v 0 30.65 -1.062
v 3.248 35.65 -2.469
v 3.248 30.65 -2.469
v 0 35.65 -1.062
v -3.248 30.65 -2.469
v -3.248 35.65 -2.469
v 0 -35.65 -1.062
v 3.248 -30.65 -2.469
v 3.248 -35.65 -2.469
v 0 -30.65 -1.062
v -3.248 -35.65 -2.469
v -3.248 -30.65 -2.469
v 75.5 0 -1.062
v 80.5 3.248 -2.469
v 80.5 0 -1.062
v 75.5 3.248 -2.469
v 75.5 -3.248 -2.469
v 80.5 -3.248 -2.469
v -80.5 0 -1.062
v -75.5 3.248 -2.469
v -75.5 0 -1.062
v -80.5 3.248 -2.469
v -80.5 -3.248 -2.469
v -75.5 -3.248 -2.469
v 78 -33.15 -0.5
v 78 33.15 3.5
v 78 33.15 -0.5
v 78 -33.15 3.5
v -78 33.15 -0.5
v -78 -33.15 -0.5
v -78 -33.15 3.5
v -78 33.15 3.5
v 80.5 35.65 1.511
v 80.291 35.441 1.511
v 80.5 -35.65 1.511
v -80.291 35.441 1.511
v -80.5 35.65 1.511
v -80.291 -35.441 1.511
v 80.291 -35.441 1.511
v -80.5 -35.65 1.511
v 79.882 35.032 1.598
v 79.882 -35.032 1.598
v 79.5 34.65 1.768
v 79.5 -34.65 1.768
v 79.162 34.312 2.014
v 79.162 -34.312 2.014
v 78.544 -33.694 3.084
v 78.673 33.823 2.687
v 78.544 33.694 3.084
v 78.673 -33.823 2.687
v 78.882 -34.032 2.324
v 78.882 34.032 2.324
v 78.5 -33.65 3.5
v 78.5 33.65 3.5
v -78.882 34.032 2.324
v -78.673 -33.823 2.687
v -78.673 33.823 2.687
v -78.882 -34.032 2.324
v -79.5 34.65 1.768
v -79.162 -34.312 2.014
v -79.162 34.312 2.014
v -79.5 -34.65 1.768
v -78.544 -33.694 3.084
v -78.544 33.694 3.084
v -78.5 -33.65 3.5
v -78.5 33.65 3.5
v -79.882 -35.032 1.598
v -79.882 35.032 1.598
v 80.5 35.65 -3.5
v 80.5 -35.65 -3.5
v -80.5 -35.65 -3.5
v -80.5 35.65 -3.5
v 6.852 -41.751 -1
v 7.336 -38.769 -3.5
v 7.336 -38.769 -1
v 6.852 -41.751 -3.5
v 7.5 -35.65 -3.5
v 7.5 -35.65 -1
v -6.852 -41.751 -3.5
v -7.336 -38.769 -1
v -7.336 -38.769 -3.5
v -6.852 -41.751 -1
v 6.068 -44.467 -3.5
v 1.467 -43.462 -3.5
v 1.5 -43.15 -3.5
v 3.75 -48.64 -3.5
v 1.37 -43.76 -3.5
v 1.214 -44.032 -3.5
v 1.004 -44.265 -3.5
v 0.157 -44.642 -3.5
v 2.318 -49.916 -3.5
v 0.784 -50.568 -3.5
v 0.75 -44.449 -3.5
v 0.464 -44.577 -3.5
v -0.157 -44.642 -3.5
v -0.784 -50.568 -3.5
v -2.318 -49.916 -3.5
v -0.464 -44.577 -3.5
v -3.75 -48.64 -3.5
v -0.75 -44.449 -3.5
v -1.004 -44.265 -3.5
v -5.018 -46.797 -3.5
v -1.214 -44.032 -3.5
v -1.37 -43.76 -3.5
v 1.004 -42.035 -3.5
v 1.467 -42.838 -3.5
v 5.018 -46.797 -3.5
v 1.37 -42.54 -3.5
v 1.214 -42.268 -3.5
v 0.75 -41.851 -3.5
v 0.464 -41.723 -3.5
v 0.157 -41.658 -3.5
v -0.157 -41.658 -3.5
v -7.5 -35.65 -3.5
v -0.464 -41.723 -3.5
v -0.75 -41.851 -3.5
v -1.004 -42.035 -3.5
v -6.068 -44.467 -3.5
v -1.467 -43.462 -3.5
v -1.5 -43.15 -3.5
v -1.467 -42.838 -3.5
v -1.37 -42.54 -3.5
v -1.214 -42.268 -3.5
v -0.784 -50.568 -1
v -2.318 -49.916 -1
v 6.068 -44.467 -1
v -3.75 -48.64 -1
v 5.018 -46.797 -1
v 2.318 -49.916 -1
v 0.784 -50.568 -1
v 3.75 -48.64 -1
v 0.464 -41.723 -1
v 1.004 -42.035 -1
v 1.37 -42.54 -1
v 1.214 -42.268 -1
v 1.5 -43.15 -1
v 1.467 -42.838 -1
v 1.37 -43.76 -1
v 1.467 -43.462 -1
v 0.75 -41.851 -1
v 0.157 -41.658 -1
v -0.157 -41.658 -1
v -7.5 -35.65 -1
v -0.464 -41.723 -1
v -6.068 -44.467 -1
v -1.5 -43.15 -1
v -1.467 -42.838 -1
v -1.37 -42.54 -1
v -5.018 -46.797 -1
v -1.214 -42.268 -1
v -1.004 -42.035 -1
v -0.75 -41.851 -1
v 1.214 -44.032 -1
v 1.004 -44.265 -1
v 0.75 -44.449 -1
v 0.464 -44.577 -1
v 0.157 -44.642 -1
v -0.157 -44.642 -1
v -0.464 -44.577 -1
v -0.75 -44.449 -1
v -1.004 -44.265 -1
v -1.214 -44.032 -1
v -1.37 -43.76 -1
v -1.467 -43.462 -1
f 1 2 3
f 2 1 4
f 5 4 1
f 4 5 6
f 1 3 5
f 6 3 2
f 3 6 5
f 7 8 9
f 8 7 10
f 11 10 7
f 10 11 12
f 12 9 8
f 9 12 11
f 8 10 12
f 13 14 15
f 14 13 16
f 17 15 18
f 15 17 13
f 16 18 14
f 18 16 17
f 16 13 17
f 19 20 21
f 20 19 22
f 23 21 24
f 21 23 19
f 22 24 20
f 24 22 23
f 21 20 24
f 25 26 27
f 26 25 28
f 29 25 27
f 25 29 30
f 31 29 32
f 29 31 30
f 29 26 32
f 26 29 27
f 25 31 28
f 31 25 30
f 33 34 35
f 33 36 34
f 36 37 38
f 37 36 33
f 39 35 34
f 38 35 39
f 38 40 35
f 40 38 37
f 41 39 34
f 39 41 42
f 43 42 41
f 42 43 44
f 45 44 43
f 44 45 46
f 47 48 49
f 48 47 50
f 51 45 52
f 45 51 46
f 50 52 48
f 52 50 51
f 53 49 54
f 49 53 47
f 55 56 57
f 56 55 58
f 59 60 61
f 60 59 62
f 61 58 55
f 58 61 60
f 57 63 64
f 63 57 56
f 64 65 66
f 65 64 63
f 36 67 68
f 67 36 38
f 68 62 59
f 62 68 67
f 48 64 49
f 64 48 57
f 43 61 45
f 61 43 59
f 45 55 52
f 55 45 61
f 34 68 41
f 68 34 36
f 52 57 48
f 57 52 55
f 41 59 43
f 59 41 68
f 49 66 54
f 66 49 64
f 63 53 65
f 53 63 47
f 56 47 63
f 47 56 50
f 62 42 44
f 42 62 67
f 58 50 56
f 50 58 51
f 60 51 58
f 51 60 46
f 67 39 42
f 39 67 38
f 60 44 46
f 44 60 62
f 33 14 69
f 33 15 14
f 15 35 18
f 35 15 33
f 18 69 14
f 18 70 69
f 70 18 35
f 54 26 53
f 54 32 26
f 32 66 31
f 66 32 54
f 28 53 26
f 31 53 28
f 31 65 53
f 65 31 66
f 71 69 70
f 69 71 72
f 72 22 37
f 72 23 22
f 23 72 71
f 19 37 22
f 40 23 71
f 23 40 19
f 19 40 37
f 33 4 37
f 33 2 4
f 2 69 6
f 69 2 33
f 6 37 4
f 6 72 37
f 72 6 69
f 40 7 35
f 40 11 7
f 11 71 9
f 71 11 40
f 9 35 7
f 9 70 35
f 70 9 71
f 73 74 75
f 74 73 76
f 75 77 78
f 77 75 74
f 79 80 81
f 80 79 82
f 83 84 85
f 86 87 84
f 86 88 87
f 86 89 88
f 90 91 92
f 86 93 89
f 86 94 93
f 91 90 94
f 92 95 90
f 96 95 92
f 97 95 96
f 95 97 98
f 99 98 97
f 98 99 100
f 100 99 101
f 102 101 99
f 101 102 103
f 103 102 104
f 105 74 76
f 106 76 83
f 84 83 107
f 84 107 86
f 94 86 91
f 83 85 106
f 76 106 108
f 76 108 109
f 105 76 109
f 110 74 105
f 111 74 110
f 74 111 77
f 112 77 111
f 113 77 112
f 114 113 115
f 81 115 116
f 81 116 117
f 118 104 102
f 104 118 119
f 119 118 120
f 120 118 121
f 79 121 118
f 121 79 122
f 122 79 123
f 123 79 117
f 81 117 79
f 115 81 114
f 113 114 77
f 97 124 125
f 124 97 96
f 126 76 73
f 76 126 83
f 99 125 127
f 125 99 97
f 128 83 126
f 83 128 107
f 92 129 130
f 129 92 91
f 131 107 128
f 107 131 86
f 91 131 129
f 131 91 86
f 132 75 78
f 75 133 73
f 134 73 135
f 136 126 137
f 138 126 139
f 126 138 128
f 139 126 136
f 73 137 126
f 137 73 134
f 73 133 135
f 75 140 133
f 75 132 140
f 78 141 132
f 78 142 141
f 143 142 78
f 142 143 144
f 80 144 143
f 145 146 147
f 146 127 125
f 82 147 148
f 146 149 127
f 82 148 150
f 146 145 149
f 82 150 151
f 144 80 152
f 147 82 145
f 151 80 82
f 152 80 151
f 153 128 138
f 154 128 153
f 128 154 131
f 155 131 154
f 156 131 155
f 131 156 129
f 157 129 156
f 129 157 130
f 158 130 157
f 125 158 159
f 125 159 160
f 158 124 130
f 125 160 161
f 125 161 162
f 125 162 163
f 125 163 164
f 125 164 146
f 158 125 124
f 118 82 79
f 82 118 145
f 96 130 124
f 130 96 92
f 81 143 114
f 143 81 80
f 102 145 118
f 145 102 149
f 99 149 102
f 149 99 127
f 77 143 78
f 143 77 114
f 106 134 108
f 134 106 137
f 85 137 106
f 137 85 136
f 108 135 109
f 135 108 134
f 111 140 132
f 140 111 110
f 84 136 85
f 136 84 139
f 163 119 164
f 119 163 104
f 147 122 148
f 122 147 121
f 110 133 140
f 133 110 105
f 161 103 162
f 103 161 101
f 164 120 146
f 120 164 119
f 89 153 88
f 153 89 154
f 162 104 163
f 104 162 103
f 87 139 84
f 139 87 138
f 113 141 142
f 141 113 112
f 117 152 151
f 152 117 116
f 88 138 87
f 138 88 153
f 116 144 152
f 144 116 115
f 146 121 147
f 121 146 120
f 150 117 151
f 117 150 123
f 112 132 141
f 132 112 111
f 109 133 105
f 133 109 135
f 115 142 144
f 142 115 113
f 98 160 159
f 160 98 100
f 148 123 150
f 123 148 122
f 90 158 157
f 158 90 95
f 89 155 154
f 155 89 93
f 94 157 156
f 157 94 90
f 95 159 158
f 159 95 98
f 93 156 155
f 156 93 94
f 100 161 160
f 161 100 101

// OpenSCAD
//------------------Variables------------------\\ 

		//----Global Values----\\
			//The default unit in OpenSCAD is mm and this unit variable allows one to change the variables in the code with units other than mm. Default is 1, for mm, but cm is 10 and inches is 25.4. Note that this entails that you change EVERY variable (except maybe sfn)  so that one piece of the model is not ridiculously bigger/smaller than the other parts. 
				unit=1;

			//The detail in the cylinders/spheres of the shape.
				sfn=30;

		//----Bill Specifics----\\

			//The length of the bill.
				billength= 156;

			//The width of the bill. 
				billwidth = 66.3;

			//The thickness of the frame. 
				framethick = 5;
			
			//Bottom Thickness
				botthick = 2 ;

		//----Frame Specifics----\\

			//The border of the frame length-wise. This is the measurement from the inside of the frame to the outisde on the length (x) axis. The cylinders that shape the frame use this measurement.
				xframe = 5;

			//The border of the frame width-wise. This is the measurement from the inside of the frame to the outisde on the width (y) axis.
				yframe = 5;
		
			//How prominent the frame shaping is. Play with this value. Default is 2.
				frameshapethick = 1.25;

			//How raised the frame shaping is. Play with this value as well. 
				frameshaperaise = 1;
		
	//----Paper clip slit size----\\\
		//Width of the paperclip slit. Adjust this value if as you want. 
		slitwidth = 10;
		
		//Height of the slit. This is actually a size control but it mainly changes the size.
		slitheight = 7.5;

		//Where the slit is. Slit is in the middle by default but depending on size you may have to raise or lower this value.
		slitlift =-4;

		//Shape of slit in sides. Default is 3 (triangle) as its overhangs are not unbearable.
		slitshape=3;

		//Slit scale (x,y,z)
		slitscalex= 0.25;
		slitscaley= 1;
		slitscalez= 1;
	
	//----Hook sizing----\\
		//Hook size
		hooksize=15;

		//Hook hole size
		hookhole=3;

		//Hook thickness
		hookthick=2.5;

//-------------------Modules-------------------\\ 

	//----Basic Frame Shapes----\\
		module bill() {
			cube([billength*unit, billwidth*unit,framethick*unit], center=true);
		}

		module outsideframe() { 
			cube([(billength+xframe)*unit, (billwidth+yframe)*unit, (framethick+botthick)*unit], center=true);
		}

	//----Frame shaping.----\\
		//Frame shaping cylinder on the X Axis.
			module xfsc() {
				cylinder(r=(framethick*unit)/(frameshapethick*2), h=(billwidth+yframe)*unit+xframe, center=true, $fn=sfn);
			}

		//Frame shaping cylinder on the Y Axis.
			module yfsc() {
				cylinder(r=(framethick*unit)/(frameshapethick*2), h=(billength+xframe)*unit+yframe, center=true, $fn=sfn);
			}

		//Frameshaping general module
			module frameshaping() {
				translate([(billength/2)*unit+xframe/2, 0, (framethick/2)*unit]) {
					rotate([90,0,0]) {
						xfsc();
					}
				}
				translate([(-billength/2)*unit-xframe/2, 0, (framethick/2)*unit]) {
					rotate([90,0,0]) {
						xfsc();
					}
				}

				translate([0, (billwidth/2)*unit+yframe/2, (framethick/2)*unit]) {
					rotate([90,0,90]) {
						yfsc();
					}
				}
				translate([0, (-billwidth/2)*unit-yframe/2, (framethick/2)*unit]) {
					rotate([90,0,90]) {
						yfsc();
					}
				}
			}

	



	//A slit on every side for a paper clip to hold it down
	module clipslit() {
		translate([0, ((billwidth+yframe)/2)*unit, slitlift*unit]) {
			rotate([0,270,90]) {
				scale([slitscalex,slitscaley,slitscalez]) {
					cylinder(r=(slitheight/2)*unit, h=slitwidth*unit, $fn=slitshape, center=true);
				}
			}
		}
		translate([0, ((billwidth+yframe)/2)*-unit, slitlift*unit]) {
			rotate([0,270,90]) {
				scale([slitscalex,slitscaley,slitscalez]) {
					cylinder(r=(slitheight/2)*unit, h=slitwidth*unit, $fn=slitshape, center=true);
				}
			}
		}
		translate([((billength+xframe)/2)*unit, 0, slitlift*unit]) {
			rotate([0,270,0]) {
				scale([slitscalex,slitscaley,slitscalez]) {
					cylinder(r=(slitheight/2)*unit, h=slitwidth*unit, $fn=slitshape, center=true);
				}
			}
		}
		translate([-unit*((billength+xframe)/2), 0, slitlift*unit]) {
			rotate([0,270,0]) {
				scale([slitscalex,slitscaley,slitscalez]) {
					cylinder(r=(slitheight/2)*unit, h=slitwidth*unit, $fn=slitshape, center=true);
				}
			}
		}				
	}

		
	module hook() {
		translate([0,-((billwidth+xframe)/2)*unit, (-(framethick+botthick)/2)*unit ]) {
			difference() {
				scale([1,2,1]) {
					cylinder(r=(hooksize/2)*unit, h=hookthick*unit, $fn=sfn);
				}
				translate([(-hooksize/2)*unit, 0]) {
					cube([hooksize*unit, hooksize*unit, hookthick*unit]);
				}
				translate([0, (-hooksize/2)*unit, 0]) {
					cylinder(r=(hookhole/2)*unit, h=hookthick*unit, $fn=sfn);
				}
			}
		}
	}


	//Plating module
	module frame() {
		difference() {
			outsideframe();
			translate([0,0, botthick]) {
				bill();
				clipslit();
			}
			translate([0,0, frameshaperaise]) {
				frameshaping();
			}
		}
	}

frame();
hook();
